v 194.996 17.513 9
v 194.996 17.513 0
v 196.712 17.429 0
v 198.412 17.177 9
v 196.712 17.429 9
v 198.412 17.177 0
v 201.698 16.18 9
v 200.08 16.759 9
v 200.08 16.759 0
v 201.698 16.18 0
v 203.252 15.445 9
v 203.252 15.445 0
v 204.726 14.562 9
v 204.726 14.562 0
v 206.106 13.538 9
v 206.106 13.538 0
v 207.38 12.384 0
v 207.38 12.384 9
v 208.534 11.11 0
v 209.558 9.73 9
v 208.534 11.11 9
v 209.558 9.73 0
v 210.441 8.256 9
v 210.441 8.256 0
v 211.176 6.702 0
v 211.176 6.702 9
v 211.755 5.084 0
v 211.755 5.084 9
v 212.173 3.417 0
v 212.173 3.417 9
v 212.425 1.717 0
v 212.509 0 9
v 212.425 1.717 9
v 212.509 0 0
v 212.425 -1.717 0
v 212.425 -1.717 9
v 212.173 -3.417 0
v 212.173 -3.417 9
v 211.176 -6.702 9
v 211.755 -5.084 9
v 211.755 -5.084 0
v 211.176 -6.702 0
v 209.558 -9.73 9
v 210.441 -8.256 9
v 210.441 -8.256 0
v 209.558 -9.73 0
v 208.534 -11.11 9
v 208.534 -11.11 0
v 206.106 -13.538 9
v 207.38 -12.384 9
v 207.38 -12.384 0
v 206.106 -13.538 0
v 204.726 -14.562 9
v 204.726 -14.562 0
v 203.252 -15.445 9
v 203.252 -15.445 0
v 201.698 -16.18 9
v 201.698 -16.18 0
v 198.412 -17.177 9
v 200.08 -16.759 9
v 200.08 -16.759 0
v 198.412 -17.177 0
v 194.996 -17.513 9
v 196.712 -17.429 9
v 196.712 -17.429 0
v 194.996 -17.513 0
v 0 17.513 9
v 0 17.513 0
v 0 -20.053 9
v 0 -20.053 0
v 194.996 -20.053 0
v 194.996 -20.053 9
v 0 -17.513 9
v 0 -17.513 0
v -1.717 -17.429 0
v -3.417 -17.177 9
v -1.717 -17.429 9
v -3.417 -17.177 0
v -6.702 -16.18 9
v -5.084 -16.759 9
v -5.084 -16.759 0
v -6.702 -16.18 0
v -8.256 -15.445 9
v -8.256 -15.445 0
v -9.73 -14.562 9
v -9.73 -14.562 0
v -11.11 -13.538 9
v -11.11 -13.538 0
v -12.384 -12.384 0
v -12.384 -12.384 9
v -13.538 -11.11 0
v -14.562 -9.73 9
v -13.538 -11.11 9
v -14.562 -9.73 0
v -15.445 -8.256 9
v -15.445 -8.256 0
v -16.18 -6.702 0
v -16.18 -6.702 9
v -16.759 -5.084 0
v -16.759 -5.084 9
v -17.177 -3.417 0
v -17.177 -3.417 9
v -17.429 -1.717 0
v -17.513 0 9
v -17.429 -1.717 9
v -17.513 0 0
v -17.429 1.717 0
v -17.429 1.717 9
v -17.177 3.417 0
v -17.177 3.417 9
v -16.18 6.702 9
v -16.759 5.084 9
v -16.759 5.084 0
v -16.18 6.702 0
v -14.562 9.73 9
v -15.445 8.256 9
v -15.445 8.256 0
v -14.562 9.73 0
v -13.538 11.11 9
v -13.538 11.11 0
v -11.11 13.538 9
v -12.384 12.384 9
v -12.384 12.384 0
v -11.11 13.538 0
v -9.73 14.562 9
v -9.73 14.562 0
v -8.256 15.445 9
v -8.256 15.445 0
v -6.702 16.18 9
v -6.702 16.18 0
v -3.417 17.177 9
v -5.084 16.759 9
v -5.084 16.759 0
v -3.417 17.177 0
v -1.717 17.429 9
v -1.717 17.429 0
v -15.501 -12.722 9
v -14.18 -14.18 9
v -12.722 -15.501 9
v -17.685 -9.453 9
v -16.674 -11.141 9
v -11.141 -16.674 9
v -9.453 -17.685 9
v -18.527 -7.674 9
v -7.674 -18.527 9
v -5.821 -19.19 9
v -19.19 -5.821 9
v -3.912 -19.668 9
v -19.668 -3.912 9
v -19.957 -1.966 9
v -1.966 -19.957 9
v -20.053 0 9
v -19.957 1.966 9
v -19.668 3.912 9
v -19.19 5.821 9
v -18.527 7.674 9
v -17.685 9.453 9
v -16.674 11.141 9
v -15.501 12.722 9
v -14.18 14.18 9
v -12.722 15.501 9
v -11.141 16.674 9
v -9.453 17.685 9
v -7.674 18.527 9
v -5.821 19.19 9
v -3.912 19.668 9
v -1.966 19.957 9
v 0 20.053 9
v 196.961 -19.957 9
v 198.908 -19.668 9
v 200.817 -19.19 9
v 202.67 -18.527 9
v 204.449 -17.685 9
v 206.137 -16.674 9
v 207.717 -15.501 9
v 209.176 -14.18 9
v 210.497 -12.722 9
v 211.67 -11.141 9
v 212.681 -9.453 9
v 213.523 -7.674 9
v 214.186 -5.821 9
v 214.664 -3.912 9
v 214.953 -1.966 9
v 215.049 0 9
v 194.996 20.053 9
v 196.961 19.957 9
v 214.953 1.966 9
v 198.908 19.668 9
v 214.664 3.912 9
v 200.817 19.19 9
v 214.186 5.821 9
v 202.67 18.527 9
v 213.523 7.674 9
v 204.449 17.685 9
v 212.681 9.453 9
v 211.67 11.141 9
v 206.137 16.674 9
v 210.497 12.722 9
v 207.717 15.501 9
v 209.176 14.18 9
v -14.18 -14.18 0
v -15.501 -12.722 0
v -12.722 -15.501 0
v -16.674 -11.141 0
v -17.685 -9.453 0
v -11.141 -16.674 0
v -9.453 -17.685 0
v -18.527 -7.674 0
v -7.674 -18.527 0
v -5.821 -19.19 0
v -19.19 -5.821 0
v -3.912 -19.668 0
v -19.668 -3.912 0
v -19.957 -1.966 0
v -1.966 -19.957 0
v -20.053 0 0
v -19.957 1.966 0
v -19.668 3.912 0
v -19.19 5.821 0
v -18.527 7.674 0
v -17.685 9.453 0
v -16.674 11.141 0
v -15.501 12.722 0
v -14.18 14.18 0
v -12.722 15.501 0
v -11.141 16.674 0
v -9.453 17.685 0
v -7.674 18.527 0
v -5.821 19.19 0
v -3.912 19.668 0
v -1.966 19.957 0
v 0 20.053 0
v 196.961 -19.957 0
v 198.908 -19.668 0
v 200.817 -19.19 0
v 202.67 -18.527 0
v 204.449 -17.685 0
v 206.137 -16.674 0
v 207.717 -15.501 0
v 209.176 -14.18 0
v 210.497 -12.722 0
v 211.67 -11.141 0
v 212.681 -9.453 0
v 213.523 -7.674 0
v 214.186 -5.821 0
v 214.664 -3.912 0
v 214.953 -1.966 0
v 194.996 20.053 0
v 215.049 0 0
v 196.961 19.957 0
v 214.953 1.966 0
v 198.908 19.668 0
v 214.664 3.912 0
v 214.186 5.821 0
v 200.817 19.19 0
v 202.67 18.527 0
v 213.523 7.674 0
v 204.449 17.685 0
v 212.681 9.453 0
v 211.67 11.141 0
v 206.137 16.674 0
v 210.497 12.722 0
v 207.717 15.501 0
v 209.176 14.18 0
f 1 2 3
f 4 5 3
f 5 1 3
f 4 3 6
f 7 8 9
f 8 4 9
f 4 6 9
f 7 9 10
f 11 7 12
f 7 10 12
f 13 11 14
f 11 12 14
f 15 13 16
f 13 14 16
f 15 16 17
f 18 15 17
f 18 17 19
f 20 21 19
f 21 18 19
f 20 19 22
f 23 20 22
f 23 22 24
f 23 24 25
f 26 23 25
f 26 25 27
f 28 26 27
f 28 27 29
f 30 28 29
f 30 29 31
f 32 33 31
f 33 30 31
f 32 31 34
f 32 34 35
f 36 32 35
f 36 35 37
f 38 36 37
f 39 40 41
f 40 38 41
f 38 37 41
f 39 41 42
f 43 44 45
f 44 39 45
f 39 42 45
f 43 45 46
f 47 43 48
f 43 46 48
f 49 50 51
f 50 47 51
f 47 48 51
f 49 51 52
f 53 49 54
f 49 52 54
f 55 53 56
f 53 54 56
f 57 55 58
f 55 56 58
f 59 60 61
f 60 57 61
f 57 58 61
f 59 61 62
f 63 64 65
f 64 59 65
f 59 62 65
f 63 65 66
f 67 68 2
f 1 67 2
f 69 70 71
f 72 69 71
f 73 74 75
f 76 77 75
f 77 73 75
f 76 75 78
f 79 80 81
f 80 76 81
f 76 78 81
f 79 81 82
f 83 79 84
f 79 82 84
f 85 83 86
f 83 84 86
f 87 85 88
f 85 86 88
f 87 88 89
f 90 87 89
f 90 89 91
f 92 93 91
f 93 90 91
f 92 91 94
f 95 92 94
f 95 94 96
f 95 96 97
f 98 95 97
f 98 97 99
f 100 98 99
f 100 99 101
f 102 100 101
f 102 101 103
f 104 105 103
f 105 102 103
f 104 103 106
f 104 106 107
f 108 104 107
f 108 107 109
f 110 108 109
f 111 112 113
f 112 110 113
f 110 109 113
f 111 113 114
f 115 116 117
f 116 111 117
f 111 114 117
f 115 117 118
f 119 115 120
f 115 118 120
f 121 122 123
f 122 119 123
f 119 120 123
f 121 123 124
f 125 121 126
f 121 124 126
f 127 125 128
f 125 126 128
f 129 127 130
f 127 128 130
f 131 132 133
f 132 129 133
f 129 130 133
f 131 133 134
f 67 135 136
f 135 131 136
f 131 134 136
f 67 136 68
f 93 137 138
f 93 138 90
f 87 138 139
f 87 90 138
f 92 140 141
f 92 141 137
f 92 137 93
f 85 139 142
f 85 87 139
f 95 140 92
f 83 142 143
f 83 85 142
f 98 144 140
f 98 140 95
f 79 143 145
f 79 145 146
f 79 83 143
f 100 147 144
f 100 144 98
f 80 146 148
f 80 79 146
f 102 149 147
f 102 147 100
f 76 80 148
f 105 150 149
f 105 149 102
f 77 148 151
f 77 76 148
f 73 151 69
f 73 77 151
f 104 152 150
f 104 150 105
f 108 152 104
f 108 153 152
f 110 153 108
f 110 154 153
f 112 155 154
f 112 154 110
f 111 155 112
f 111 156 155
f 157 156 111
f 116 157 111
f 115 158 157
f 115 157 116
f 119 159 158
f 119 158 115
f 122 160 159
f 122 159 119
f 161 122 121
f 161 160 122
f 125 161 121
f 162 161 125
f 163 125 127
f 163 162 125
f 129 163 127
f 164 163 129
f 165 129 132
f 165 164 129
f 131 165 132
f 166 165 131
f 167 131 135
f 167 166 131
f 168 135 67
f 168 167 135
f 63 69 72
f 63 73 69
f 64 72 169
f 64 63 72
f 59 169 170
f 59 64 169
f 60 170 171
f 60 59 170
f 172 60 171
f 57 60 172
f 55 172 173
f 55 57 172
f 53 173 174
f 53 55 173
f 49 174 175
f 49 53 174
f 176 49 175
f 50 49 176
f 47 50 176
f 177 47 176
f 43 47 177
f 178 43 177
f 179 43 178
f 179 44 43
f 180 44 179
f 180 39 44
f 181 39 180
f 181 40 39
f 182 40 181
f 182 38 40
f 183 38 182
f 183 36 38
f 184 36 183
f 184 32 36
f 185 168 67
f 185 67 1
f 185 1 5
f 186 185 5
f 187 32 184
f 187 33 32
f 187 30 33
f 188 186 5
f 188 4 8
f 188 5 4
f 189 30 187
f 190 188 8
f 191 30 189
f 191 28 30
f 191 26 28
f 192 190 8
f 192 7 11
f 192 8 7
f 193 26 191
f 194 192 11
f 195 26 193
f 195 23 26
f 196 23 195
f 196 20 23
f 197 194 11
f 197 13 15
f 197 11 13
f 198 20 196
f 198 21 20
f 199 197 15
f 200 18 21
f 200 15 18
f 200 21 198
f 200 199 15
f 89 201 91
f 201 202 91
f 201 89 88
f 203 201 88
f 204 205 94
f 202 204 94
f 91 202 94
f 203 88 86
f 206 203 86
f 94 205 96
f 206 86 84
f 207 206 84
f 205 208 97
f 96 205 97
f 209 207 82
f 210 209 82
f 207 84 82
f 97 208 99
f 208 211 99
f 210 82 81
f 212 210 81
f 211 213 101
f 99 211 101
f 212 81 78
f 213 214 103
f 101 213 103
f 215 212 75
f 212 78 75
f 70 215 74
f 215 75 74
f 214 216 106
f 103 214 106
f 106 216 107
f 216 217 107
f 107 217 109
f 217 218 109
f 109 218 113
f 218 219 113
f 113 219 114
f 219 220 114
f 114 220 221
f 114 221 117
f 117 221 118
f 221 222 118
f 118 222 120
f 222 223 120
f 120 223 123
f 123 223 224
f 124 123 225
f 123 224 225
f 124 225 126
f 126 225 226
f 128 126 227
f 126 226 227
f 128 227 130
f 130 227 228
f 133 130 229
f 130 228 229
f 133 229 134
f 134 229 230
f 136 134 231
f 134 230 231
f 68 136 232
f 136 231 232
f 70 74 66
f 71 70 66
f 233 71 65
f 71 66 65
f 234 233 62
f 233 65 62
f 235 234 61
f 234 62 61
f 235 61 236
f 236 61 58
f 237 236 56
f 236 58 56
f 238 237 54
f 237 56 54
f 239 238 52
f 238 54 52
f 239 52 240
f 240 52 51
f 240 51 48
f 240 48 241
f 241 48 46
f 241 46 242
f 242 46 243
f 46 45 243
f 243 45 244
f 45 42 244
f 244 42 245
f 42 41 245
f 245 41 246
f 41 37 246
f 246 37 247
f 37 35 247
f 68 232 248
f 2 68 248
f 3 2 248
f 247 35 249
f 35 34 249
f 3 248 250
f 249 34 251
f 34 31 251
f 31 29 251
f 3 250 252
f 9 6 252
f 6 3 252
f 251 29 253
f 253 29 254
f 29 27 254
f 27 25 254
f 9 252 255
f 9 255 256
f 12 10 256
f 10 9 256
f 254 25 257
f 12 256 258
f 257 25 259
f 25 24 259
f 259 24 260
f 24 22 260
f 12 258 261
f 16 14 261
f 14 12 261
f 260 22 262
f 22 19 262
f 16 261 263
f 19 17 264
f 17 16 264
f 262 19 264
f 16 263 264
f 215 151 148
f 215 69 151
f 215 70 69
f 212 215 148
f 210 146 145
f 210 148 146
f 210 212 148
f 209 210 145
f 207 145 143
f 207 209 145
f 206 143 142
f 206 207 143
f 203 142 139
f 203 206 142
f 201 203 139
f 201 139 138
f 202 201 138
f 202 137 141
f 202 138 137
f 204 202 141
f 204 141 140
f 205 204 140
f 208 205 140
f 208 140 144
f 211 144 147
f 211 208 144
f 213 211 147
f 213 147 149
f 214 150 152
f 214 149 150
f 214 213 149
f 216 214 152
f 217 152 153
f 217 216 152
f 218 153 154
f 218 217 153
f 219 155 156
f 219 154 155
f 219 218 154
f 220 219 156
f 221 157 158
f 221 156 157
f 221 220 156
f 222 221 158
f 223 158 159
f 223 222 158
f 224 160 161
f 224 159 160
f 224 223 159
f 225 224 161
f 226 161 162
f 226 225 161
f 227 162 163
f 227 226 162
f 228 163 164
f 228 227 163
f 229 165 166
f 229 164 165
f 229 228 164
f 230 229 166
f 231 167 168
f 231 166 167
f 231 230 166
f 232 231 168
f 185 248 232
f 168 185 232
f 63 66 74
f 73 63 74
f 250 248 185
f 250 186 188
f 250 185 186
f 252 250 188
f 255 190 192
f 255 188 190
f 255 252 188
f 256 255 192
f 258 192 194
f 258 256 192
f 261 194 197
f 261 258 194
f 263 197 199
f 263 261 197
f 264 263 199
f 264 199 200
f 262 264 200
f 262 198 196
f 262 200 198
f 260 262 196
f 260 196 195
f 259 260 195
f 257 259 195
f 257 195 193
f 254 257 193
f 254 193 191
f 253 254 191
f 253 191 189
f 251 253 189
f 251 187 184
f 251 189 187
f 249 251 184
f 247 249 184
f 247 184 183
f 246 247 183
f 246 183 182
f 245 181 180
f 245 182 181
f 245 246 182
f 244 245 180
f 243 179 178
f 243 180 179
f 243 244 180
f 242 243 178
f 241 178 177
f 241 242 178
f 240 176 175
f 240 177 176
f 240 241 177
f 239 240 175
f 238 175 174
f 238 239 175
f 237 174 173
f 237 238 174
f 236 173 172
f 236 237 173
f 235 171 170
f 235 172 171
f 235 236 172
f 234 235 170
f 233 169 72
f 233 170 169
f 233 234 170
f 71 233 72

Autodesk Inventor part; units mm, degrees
ref_plane "YZ Plane" through (0, 0, 0) normal (1, 0, 0) x (0, 1, 0)
ref_plane "XZ Plane" through (0, 0, 0) normal (0, 1, 0) x (-1, 0, 0)
ref_plane "XY Plane" through (0, 0, 0) normal (0, 0, 1) x (1, 0, 0)
sketch "Sketch1" plane through (0, 0, 0) normal (0, 0, 1) x (1, 0, 0)
  arc A0 (0, 17.5133) -> (0, -17.5133) centre (0, 0) ccw
  arc A1 (194.9958, -17.5133) -> (194.9958, 17.5133) centre (194.9958, 0) ccw
  line L0 (0, 17.5133) -> (194.9958, 17.5133)
  line L1 (194.9958, -17.5133) -> (0, -17.5133)
  line L2 (194.9958, 20.0533) -> (0, 20.0533)
  arc A2 (0, 20.0533) -> (0, -20.0533) centre (0, 0) ccw
  line L3 (0, -20.0533) -> (194.9958, -20.0533)
  arc A3 (194.9958, -20.0533) -> (194.9958, 20.0533) centre (194.9958, 0) ccw
  dimension "d0" = 35.0266
  dimension "d1" = 194.9958
  dimension "d2" = 2.54
extrude "Extrusion1" add sketch "Sketch1" along normal blind 9
properties part number "INDX_022_SideBelt" material "Rubber"
